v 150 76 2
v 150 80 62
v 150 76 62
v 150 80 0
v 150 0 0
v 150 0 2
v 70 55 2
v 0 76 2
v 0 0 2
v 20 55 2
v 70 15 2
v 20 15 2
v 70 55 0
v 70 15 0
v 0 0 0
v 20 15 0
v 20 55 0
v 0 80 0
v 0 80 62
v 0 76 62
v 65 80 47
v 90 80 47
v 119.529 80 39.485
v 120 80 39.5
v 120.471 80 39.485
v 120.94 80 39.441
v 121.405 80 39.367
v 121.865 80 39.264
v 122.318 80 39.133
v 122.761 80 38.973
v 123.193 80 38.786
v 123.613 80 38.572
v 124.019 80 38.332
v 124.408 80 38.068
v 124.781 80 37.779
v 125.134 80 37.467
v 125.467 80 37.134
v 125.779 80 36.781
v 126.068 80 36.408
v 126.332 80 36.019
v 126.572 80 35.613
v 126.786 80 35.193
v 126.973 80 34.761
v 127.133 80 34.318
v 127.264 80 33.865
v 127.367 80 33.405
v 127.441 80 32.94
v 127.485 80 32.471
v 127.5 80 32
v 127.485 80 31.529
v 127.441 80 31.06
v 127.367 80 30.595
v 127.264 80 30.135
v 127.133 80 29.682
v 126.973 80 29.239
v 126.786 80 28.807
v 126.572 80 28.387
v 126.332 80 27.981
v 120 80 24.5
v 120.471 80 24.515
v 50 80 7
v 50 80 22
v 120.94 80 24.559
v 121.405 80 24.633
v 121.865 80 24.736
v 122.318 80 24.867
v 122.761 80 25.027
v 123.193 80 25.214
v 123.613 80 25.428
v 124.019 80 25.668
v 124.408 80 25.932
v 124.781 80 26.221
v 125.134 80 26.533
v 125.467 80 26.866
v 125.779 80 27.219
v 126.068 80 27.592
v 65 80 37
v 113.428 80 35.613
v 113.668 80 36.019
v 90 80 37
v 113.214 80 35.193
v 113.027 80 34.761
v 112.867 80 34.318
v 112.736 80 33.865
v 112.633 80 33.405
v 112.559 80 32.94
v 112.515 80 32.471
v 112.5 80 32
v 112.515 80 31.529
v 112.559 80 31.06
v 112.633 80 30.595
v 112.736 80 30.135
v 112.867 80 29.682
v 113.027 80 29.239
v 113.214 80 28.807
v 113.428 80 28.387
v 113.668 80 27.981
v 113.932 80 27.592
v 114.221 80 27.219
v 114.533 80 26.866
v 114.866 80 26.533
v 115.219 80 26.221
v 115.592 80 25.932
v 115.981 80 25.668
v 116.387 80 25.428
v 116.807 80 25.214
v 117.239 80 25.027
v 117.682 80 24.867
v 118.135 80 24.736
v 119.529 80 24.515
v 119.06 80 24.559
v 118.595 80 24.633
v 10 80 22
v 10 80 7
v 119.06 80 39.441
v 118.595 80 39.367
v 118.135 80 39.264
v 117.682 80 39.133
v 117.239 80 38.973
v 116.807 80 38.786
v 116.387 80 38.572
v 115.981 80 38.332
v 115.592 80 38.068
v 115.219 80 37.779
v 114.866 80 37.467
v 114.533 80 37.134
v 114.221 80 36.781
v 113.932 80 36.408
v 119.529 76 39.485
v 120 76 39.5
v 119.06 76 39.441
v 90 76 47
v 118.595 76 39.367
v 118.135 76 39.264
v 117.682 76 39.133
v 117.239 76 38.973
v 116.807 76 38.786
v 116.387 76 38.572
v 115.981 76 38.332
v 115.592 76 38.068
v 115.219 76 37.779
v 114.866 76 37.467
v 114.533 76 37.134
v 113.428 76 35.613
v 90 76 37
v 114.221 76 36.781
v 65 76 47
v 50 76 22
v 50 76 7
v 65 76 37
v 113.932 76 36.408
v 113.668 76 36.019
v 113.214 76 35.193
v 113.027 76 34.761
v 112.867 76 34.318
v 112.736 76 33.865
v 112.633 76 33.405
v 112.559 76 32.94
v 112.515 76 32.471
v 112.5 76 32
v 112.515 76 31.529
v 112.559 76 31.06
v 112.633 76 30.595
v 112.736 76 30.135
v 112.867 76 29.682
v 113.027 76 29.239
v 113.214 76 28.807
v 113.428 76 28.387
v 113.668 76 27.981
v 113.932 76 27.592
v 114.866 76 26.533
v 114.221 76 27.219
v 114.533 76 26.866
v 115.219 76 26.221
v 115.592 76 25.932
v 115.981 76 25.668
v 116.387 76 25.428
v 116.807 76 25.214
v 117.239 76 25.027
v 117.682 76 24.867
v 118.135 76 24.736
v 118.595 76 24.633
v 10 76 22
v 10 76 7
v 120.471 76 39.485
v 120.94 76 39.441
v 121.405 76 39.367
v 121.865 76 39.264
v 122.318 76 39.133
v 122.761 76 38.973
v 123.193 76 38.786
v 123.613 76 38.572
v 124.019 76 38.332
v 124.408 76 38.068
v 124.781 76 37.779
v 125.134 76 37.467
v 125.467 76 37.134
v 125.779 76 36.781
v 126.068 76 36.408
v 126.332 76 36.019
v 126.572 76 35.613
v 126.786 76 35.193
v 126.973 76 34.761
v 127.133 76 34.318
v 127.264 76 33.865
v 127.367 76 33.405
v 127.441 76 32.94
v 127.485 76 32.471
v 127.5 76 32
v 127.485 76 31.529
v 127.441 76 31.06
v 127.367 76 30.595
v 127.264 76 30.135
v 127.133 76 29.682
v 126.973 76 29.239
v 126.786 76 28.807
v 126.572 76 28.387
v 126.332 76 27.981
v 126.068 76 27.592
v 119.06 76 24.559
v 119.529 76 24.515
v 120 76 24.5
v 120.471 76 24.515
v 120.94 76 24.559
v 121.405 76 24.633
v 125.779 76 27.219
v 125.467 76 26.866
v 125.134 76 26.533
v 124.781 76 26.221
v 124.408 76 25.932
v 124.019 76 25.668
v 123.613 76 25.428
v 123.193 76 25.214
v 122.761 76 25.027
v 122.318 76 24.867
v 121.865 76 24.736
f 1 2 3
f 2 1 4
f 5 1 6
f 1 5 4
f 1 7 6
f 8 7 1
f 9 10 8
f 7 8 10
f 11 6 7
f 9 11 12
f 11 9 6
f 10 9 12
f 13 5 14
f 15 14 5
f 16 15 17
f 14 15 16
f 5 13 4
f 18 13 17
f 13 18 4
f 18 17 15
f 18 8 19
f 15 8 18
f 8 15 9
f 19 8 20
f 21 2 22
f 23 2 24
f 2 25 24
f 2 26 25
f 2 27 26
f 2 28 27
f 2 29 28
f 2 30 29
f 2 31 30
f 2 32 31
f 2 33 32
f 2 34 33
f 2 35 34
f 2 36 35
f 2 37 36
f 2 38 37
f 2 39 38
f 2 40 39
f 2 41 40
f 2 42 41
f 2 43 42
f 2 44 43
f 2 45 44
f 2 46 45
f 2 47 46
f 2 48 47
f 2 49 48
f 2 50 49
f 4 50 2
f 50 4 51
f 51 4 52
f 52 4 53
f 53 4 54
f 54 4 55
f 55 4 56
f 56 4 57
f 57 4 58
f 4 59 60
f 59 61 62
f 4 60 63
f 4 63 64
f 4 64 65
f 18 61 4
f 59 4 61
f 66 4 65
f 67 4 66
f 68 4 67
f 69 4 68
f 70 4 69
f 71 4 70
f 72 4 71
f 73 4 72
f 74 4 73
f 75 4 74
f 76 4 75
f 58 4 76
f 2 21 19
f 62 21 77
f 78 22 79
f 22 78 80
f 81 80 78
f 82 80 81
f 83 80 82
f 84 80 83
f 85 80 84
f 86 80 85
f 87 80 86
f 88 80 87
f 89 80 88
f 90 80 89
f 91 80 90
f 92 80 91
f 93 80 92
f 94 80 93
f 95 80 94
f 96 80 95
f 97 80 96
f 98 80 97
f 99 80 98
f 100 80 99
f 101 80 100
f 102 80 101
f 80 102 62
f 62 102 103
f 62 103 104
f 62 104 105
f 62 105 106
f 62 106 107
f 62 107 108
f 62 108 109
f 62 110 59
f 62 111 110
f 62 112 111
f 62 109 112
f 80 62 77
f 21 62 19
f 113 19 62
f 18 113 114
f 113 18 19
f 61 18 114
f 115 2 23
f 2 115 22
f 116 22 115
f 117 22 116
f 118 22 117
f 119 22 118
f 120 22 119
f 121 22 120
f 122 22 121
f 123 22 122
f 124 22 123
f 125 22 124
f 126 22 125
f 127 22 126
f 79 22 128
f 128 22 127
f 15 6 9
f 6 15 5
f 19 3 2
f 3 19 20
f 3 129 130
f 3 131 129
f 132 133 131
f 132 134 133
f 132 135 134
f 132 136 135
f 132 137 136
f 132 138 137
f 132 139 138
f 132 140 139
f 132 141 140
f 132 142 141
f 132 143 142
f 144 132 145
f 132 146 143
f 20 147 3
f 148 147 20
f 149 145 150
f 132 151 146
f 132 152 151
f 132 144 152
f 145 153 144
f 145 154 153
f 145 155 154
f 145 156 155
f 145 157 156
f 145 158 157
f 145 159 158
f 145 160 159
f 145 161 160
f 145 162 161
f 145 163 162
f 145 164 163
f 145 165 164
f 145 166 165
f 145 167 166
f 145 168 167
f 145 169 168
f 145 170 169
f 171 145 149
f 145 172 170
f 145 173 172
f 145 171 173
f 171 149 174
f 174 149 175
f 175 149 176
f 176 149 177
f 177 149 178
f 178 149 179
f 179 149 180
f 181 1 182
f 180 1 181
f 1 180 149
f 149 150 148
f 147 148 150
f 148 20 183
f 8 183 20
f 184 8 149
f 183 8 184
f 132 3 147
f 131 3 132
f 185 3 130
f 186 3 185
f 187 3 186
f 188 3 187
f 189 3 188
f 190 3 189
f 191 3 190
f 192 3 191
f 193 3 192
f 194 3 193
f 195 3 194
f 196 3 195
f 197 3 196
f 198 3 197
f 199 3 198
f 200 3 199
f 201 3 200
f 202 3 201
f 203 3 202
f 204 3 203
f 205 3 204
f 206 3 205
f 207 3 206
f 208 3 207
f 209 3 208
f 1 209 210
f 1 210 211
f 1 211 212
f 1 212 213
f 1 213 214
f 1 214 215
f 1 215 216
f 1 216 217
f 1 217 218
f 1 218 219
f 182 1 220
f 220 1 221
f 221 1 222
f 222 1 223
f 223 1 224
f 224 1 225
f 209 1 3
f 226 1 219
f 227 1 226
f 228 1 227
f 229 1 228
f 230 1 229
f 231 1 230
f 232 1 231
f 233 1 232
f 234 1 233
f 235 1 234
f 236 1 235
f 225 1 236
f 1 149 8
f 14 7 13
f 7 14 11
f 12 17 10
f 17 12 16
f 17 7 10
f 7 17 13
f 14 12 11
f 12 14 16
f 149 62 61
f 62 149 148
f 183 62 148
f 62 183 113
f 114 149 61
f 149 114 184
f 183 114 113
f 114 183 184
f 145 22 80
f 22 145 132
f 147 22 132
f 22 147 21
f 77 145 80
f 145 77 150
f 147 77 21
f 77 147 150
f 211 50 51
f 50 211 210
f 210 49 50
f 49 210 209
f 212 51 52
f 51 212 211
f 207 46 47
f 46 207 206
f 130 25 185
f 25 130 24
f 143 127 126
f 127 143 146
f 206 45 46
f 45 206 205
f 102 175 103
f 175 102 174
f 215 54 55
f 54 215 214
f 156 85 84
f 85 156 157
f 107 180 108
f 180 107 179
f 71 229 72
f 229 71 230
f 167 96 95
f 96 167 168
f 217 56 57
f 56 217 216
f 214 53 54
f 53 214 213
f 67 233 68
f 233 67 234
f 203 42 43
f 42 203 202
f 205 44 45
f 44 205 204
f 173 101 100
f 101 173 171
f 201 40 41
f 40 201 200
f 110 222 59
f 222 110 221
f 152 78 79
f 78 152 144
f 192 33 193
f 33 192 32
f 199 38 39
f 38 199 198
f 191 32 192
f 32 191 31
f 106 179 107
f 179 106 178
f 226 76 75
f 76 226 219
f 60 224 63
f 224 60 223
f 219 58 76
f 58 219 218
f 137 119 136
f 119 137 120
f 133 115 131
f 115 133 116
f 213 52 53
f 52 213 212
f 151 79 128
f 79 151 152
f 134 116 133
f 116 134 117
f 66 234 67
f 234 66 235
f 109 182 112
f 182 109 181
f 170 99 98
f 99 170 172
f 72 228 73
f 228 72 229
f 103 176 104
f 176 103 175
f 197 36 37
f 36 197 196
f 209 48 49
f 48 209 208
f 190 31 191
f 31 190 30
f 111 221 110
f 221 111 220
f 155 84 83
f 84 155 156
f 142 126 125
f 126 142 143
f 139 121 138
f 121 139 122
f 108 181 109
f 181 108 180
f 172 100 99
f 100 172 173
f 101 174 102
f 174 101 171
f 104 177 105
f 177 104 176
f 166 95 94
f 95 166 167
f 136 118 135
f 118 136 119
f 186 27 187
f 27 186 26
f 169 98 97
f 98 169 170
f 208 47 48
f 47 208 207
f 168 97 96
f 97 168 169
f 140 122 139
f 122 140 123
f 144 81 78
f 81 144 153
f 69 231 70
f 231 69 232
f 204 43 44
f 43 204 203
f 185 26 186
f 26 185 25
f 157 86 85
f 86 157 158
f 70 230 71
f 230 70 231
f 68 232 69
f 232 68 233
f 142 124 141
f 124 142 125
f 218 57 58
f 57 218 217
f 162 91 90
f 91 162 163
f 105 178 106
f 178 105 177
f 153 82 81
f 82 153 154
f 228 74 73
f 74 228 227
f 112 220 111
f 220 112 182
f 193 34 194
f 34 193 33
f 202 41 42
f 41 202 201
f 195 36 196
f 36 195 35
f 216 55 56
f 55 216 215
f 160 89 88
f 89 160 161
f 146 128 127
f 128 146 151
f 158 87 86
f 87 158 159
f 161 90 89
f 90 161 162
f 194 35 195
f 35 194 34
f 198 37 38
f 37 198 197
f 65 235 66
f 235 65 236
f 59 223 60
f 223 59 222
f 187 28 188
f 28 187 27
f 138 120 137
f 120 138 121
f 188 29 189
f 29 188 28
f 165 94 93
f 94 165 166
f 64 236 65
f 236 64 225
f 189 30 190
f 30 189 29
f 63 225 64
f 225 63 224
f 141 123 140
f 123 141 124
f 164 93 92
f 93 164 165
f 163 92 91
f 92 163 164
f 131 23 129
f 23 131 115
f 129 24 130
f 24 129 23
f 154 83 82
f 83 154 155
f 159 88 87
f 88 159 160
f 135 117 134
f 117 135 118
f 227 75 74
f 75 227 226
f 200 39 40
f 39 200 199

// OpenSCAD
// Parameters for the base sheet
base_length = 150;
base_width = 80;
base_thickness = 2;

// Parameters for the upright wall
wall_height = 60;
wall_thickness = 4;

// Parameters for the floor cut
floor_cut_length = 50;
floor_cut_width = 40;
floor_cut_x = 20;
floor_cut_y = 15;

// Parameters for the lower wall cut
wall_cut_lower_length = 40;
wall_cut_lower_height = 15;
wall_cut_lower_x = 10;
wall_cut_lower_z = 5; // Height above the top face of the base

// Parameters for the higher wall cut
wall_cut_upper_length = 25;
wall_cut_upper_height = 10;
wall_cut_upper_x = 65;
wall_cut_upper_z = 35; // Height above the top face of the base

// Parameters for the wall hole
wall_hole_diameter = 15;
wall_hole_x = 120;
wall_hole_z = 30; // Height above the top face of the base

// Resolution and boolean operation tolerance
$fn = 100;
eps = 0.01; // Small overlap to ensure manifold geometry during cuts

// Module: Main solid geometry before cuts
module solid_structure() {
    union() {
        // Thin rectangular base sheet
        cube([base_length, base_width, base_thickness]);

        // Single solid upright wall along the back edge
        translate([0, base_width - wall_thickness, base_thickness]) {
            cube([base_length, wall_thickness, wall_height]);
        }
    }
}

// Module: All void volumes to be subtracted
module void_cuts() {
    // Rectangular cut through the floor plate
    translate([floor_cut_x, floor_cut_y, -eps]) {
        cube([floor_cut_length, floor_cut_width, base_thickness + (2 * eps)]);
    }

    // Lower rectangular opening in the wall
    translate([wall_cut_lower_x, base_width - wall_thickness - eps, base_thickness + wall_cut_lower_z]) {
        cube([wall_cut_lower_length, wall_thickness + (2 * eps), wall_cut_lower_height]);
    }

    // Smaller, higher rectangular opening in the wall
    translate([wall_cut_upper_x, base_width - wall_thickness - eps, base_thickness + wall_cut_upper_z]) {
        cube([wall_cut_upper_length, wall_thickness + (2 * eps), wall_cut_upper_height]);
    }

    // Round through-hole in the wall
    translate([wall_hole_x, base_width - wall_thickness - eps, base_thickness + wall_hole_z]) {
        // Rotate cylinder to align with the Y-axis (cutting through the wall thickness)
        rotate([-90, 0, 0]) {
            cylinder(h = wall_thickness + (2 * eps), d = wall_hole_diameter);
        }
    }
}

// Main Assembly: Subtract voids from the solid structure
difference() {
    solid_structure();
    void_cuts();
}
